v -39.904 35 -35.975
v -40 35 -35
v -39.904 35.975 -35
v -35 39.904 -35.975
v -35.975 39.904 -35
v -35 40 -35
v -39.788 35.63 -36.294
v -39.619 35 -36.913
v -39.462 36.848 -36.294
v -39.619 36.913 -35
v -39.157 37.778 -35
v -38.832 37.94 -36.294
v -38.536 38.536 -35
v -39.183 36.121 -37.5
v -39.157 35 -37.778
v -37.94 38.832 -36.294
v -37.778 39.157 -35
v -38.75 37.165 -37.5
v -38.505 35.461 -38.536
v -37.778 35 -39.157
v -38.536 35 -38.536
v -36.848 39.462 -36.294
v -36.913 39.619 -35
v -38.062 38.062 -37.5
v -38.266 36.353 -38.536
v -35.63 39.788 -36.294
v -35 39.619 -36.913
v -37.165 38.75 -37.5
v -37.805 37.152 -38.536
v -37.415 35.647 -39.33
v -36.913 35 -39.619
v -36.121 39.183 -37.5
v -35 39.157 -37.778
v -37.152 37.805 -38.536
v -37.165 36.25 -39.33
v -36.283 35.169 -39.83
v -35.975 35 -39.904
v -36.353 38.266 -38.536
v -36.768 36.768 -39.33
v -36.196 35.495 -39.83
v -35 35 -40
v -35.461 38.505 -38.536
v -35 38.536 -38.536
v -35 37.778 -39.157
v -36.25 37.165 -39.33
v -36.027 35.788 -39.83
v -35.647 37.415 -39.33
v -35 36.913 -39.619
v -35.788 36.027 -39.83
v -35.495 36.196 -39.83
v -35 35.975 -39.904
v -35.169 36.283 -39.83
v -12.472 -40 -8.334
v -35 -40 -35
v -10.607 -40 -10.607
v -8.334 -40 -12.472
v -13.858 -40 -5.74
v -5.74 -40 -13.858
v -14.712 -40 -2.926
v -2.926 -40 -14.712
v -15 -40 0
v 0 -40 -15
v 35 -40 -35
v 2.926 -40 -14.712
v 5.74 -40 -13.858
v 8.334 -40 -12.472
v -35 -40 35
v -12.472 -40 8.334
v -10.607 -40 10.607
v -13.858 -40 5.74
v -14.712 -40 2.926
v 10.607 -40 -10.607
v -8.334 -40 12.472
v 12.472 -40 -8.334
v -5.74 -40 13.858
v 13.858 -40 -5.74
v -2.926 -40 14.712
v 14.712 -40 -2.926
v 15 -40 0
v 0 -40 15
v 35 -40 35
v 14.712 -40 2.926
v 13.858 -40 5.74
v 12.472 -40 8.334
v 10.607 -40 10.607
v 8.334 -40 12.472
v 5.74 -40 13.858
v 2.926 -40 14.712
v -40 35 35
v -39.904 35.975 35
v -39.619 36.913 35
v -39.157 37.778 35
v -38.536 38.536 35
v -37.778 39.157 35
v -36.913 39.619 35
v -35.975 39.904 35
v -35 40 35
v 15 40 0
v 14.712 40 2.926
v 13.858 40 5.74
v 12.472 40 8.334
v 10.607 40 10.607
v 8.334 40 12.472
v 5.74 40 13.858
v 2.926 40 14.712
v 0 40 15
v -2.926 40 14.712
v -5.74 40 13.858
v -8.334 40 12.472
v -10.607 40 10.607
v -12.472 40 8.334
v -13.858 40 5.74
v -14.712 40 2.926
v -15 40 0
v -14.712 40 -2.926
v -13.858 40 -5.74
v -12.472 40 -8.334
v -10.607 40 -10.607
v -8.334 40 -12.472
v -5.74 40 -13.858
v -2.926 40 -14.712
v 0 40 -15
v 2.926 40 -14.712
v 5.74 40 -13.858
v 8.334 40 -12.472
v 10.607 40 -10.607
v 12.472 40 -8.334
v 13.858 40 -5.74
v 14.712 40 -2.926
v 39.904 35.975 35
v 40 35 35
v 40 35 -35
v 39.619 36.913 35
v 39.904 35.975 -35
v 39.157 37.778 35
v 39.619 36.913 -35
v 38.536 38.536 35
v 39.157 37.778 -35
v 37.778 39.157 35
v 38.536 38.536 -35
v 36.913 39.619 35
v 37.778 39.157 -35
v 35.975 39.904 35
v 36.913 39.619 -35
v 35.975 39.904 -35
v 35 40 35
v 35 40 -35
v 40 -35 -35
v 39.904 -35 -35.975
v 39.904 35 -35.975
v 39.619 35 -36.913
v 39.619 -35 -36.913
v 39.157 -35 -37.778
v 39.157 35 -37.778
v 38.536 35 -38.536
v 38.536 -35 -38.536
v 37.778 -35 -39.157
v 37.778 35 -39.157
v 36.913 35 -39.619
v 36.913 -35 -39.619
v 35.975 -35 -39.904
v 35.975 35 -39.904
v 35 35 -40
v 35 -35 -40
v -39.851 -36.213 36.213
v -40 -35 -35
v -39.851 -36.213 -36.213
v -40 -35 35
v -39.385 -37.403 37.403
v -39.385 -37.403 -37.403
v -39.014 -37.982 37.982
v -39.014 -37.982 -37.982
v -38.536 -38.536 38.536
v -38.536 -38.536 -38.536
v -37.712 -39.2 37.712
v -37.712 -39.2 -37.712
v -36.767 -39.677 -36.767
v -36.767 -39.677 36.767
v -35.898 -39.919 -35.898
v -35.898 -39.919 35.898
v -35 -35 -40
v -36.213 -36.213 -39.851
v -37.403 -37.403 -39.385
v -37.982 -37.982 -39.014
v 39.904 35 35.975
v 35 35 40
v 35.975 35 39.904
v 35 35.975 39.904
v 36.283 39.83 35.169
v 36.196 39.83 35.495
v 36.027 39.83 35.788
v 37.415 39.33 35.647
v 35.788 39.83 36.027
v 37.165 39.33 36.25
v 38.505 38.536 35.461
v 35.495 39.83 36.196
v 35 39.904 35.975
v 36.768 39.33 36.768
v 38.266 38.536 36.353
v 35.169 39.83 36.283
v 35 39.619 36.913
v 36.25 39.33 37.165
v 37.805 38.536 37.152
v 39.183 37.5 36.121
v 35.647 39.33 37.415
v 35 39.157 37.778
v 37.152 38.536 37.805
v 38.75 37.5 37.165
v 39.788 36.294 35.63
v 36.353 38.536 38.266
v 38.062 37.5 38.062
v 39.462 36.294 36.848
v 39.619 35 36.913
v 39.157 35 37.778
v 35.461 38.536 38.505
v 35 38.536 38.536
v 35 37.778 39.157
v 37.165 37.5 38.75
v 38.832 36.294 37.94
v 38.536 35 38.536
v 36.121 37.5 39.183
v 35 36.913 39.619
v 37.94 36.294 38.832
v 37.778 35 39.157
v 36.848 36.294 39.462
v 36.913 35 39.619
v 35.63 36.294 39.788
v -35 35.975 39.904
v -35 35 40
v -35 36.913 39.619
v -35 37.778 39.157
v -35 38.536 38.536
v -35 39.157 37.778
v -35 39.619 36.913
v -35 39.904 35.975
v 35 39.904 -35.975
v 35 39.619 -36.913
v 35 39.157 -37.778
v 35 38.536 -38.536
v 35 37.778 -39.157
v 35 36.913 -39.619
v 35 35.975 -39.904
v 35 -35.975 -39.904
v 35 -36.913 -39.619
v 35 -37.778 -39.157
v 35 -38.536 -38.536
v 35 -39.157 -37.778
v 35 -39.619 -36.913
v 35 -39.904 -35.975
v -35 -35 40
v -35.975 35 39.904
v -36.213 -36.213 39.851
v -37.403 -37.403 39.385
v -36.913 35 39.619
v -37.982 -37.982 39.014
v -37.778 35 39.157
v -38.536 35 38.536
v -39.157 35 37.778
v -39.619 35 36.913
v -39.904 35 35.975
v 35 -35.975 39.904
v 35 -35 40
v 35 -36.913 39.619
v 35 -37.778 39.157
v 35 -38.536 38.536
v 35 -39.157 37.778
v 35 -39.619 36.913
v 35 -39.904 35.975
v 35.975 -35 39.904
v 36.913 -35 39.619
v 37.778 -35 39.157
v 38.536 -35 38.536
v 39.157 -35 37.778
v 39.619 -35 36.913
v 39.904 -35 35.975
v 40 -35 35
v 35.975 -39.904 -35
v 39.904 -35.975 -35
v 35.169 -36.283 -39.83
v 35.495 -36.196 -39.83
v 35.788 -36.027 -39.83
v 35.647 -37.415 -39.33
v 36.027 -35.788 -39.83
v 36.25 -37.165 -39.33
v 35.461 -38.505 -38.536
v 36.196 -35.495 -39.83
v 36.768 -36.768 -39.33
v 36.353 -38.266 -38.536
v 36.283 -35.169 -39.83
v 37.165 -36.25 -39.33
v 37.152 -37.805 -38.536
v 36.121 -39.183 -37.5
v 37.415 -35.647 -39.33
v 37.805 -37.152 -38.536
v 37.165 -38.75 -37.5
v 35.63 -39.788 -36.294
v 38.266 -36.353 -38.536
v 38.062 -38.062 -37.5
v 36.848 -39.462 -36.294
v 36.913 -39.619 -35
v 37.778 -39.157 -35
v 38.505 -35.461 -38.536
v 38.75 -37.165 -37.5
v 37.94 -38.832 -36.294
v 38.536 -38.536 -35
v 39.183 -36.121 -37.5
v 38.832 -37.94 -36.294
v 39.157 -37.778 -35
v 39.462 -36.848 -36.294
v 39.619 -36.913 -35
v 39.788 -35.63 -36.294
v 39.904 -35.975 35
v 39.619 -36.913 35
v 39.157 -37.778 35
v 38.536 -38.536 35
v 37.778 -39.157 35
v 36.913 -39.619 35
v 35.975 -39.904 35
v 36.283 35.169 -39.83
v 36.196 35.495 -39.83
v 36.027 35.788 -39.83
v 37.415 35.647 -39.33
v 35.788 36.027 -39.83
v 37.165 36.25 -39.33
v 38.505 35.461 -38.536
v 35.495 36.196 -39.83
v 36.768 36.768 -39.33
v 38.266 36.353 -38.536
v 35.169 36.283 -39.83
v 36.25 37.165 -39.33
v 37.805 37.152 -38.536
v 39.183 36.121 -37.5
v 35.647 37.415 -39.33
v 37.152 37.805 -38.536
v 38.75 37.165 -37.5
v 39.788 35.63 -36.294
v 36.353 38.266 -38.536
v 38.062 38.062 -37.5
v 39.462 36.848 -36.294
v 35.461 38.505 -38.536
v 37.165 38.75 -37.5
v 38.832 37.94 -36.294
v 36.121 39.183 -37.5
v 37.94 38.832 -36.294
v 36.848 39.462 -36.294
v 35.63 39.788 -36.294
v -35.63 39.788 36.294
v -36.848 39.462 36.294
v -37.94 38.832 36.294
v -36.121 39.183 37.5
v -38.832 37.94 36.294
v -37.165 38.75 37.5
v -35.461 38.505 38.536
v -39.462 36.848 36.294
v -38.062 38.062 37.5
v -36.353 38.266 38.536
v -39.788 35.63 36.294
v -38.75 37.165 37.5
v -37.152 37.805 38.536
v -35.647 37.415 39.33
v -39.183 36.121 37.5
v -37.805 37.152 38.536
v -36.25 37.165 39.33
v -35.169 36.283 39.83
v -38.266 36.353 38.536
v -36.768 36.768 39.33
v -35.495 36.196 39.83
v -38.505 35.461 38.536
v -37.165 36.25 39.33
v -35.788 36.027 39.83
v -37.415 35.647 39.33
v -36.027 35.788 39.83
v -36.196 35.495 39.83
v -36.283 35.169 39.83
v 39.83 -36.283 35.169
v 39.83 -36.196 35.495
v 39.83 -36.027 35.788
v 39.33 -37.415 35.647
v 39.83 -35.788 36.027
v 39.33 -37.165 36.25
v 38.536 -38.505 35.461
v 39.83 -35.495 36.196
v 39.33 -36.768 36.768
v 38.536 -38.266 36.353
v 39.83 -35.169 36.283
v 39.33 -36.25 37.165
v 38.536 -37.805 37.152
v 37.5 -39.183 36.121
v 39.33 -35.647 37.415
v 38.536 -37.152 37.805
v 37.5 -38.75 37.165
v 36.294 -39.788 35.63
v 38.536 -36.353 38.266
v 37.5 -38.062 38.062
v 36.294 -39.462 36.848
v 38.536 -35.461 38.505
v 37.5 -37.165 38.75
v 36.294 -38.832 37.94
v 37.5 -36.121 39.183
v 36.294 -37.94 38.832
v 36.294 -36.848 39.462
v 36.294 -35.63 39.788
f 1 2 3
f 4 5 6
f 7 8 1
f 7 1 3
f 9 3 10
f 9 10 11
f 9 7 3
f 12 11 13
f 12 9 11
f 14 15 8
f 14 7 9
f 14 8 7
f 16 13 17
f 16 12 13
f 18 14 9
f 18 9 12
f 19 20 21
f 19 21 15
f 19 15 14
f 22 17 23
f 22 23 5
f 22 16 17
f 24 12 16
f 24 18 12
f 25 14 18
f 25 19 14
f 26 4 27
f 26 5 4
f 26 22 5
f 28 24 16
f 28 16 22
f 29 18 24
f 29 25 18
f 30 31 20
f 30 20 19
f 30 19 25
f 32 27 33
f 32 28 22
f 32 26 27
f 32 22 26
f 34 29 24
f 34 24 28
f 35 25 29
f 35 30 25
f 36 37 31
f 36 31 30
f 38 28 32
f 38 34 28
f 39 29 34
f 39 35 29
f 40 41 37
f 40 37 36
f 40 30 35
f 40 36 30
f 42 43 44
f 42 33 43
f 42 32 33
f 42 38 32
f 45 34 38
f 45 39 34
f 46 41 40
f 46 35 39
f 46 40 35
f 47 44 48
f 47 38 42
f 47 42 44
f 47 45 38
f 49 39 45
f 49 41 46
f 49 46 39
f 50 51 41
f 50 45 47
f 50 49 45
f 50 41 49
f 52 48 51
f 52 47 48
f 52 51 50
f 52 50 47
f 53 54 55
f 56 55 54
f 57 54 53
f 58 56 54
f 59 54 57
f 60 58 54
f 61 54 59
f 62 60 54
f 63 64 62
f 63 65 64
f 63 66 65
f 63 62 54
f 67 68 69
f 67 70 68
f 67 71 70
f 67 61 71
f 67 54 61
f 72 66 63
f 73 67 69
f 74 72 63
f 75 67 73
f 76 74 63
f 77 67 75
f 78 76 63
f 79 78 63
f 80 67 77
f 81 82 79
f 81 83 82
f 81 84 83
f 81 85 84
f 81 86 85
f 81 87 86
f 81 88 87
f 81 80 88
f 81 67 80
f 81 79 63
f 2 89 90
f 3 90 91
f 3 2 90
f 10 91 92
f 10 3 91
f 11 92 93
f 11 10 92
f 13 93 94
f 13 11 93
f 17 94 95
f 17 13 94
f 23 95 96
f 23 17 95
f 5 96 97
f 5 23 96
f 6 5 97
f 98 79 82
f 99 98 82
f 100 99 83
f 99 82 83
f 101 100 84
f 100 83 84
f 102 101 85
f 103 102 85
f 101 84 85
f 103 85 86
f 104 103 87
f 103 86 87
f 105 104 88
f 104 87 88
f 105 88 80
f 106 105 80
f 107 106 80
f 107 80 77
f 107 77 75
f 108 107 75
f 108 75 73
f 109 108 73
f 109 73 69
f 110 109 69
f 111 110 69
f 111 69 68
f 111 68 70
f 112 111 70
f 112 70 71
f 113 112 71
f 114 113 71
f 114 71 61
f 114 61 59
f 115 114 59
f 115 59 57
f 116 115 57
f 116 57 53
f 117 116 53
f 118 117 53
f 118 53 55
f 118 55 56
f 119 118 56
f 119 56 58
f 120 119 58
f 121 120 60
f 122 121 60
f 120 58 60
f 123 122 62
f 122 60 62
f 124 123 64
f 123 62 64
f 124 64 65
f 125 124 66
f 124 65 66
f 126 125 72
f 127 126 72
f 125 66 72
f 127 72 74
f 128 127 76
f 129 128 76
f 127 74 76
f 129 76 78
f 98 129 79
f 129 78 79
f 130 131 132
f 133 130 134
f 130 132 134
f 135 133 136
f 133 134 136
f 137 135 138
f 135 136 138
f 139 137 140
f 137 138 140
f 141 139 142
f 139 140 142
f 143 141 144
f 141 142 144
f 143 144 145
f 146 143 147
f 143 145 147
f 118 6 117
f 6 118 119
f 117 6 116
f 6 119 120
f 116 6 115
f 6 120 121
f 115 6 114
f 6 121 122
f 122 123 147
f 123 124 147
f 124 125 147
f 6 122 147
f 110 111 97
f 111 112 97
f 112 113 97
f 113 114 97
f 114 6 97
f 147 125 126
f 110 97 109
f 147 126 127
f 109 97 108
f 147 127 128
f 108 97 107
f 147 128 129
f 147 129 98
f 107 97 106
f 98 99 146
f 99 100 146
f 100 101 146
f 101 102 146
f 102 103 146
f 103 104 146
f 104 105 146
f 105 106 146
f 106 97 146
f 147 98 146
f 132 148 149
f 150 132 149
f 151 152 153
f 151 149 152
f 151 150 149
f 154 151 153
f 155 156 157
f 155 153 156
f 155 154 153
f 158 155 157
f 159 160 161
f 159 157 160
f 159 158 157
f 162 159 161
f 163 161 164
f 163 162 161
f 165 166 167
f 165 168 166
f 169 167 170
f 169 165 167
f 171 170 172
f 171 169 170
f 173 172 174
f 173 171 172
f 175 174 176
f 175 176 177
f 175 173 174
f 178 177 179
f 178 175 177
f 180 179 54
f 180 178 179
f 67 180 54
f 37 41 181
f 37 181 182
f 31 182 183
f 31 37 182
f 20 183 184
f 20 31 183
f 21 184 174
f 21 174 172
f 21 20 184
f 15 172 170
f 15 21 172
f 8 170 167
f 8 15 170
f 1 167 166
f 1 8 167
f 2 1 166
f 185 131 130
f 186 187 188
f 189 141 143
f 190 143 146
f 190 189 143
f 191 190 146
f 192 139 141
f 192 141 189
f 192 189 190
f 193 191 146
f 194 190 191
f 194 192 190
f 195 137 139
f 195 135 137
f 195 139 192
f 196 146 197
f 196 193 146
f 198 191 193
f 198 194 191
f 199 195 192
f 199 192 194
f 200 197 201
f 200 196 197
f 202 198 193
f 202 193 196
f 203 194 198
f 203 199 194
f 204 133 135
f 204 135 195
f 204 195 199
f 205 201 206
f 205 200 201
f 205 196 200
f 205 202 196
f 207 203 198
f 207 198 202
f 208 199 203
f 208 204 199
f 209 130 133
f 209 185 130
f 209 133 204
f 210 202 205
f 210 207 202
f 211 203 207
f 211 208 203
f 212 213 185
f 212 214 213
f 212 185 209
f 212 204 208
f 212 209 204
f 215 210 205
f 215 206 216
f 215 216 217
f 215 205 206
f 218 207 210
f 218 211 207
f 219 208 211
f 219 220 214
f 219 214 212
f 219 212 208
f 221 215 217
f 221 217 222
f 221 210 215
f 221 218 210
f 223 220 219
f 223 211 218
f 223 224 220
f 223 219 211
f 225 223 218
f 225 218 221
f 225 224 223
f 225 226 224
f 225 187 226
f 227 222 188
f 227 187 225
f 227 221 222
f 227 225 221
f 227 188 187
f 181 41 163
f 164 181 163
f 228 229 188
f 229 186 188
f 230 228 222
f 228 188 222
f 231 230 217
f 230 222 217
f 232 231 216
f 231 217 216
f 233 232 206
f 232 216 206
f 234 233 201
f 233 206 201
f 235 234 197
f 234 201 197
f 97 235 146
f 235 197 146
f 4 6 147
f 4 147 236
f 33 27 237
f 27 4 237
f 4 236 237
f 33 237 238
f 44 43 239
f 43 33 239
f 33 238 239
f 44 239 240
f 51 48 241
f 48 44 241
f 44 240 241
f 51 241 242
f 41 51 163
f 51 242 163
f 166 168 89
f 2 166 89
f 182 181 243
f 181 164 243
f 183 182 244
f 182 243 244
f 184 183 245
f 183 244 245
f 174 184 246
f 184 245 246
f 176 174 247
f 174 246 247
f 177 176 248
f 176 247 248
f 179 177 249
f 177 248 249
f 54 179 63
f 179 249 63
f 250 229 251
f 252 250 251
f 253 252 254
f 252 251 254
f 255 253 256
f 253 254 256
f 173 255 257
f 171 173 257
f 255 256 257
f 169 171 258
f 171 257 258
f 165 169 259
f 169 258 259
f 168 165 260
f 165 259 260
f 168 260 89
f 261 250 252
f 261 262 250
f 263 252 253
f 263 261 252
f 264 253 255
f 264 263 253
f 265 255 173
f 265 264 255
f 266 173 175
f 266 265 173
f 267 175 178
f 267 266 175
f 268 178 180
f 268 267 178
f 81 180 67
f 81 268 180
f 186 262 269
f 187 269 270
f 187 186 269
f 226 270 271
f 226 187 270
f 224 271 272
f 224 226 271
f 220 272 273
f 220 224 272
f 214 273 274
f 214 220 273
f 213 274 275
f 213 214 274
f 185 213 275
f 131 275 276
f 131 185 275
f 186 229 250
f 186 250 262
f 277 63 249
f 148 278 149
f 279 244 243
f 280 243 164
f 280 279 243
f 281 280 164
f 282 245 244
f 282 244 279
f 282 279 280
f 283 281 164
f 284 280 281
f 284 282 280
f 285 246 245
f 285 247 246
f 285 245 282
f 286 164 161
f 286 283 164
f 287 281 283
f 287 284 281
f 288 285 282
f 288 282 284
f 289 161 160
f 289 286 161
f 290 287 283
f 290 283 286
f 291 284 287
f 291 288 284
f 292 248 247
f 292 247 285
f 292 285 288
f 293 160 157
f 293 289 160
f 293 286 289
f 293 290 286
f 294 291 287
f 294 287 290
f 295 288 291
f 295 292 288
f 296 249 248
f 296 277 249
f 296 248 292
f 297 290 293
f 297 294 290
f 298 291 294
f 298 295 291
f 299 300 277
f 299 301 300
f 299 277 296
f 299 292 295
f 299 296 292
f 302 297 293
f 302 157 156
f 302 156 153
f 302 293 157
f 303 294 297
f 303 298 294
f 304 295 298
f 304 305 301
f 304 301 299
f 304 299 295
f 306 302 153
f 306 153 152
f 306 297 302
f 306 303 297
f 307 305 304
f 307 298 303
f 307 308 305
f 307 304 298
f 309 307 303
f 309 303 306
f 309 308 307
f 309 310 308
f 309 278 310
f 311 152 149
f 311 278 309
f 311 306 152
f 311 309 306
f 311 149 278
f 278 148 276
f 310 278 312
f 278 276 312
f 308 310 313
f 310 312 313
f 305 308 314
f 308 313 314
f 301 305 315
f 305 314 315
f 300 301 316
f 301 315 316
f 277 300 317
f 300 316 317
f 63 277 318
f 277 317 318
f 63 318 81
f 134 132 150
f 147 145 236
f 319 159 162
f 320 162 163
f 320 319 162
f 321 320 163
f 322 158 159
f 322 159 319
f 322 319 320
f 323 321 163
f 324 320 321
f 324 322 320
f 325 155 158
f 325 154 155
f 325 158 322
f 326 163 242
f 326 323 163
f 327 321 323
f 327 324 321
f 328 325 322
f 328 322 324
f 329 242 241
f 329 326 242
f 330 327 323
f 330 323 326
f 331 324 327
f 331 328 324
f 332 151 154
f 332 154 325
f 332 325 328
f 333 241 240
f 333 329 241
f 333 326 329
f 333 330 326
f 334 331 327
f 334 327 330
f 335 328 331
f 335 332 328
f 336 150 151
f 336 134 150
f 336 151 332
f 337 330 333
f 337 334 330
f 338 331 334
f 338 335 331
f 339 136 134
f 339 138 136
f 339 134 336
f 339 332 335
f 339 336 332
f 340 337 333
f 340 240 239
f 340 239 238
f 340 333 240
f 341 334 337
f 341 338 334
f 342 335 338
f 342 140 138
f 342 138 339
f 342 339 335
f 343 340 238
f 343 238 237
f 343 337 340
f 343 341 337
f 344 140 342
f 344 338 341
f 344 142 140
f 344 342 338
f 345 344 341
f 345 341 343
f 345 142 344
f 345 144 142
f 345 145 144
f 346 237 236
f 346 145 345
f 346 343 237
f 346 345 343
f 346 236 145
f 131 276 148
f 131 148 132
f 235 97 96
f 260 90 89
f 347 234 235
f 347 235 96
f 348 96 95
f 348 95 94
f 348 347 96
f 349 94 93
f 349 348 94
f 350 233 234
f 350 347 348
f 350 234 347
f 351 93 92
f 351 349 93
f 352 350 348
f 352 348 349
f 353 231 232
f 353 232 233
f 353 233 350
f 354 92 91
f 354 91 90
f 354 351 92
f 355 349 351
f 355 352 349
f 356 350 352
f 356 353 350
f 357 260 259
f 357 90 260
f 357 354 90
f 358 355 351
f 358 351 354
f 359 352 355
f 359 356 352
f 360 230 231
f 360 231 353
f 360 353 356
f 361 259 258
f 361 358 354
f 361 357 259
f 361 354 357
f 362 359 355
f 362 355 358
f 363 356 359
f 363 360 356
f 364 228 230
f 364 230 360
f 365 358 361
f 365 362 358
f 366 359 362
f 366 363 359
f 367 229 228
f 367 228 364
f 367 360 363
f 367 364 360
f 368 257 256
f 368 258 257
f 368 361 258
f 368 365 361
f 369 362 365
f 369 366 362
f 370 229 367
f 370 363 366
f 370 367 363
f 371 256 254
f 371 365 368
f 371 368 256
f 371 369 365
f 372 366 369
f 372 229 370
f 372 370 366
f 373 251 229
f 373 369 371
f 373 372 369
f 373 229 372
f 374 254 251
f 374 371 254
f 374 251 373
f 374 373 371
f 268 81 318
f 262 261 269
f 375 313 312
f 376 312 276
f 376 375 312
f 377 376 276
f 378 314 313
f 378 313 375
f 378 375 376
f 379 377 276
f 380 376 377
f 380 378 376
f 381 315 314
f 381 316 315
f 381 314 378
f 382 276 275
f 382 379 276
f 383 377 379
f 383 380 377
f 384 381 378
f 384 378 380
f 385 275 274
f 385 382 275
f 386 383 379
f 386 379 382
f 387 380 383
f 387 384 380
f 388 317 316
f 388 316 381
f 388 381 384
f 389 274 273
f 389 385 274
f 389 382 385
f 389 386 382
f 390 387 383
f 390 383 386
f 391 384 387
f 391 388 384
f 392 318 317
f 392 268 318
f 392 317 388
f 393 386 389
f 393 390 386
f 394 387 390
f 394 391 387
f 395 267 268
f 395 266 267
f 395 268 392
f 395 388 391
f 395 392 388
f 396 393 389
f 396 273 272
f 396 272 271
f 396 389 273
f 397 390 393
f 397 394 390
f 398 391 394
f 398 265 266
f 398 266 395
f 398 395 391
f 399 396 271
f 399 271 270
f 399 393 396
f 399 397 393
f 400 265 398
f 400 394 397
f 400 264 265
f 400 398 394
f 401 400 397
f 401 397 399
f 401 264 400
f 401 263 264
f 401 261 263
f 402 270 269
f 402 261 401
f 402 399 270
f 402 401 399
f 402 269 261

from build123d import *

# Parameters (mm, degrees)
F0_W         = 80
F0_H         = 80
F1_DEPTH     = 40
F2_R         = 5
F3_T1_DEPTH  = 82.5
F3_S5_W      = 5.1
F3_S5_H      = 5.1
F3_T6_DEPTH  = 5.1
F3_S11_W     = 5.1
F3_S11_H     = 5.1
F3_T12_DEPTH = 5.1
F4_R         = 15
F5_DEPTH     = 80.001


# Not quite as in the source:
# - a fillet or chamfer that OpenCascade refuses, or shapes differently, is made with other operations: its cross-section is extruded or revolved along the edge and cut away or added


with BuildPart() as f1:
    # F0 (on Top) → F1 (new body, symmetric)
    with BuildSketch(Plane.XY):
        Rectangle(F0_W, F0_H)
    extrude(amount=F1_DEPTH, both=True)

    # F2
    f2_edges = [f1.edges().sort_by_distance(p)[0] for p in [
        (0, -40, 40),
        (-40, -40, 0),
        (40, -40, 0),
        (0, -40, -40),
        (40, 0, 40),
        (40, 40, 0),
        (40, 0, -40),
        (0, 40, 40),
        (-40, 40, 0),
        (0, 40, -40),
    ]]
    fillet(f2_edges, radius=F2_R)

    # F3: fillet of radius 5 on 6 edges, made by hand

    # F3_s2 → F3_t1 (cut)
    with BuildSketch(Plane.XZ.offset(-35)):
        with BuildLine():
            ThreePointArc((-35, 40), (-38.5355339059, 38.5355339059), (-40, 35))
            Line((-40, 35), (-40, 40))
            Line((-40, 40), (-35, 40))
        make_face()
        with BuildLine():
            ThreePointArc((-35, -40), (-38.5355339059, -38.5355339059), (-40, -35))
            Line((-40, -35), (-40, -40))
            Line((-40, -40), (-35, -40))
        make_face()
    extrude(amount=F3_T1_DEPTH, mode=Mode.SUBTRACT)


with BuildPart() as f3_tool4:
    # F3_s5 → F3_t6 (new body)
    with BuildSketch(Plane.XY.offset(-35)):
        with Locations((-37.55, 37.55)):
            Rectangle(F3_S5_W, F3_S5_H)
    extrude(amount=-F3_T6_DEPTH)

    # F3_s7 → F3_t8 (revolve, cut)
    with BuildSketch(Plane(origin=(-35, 35, -35), x_dir=(0.7071067812, -0.7071067812, 0), z_dir=(0.7071067812, 0.7071067812, 0))):
        with BuildLine():
            ThreePointArc((0, -5), (5, 0), (0, 5))
            Line((0, 5), (0, -5))
        make_face()
    revolve(axis=Axis((-35, 35, -35), (0, 0, -1)), mode=Mode.SUBTRACT)


with BuildPart() as f1_1:
    add(f1.part)

    # F3_t3: cut F3_tool4
    add(f3_tool4.part, mode=Mode.SUBTRACT)


with BuildPart() as f3_tool10:
    # F3_s11 → F3_t12 (new body)
    with BuildSketch(Plane.XY.offset(35)):
        with Locations((-37.55, 37.55)):
            Rectangle(F3_S11_W, F3_S11_H)
    extrude(amount=F3_T12_DEPTH)

    # F3_s13 → F3_t14 (revolve, cut)
    with BuildSketch(Plane(origin=(-35, 35, 35), x_dir=(0.7071067812, -0.7071067812, 0), z_dir=(-0.7071067812, -0.7071067812, 0))):
        with BuildLine():
            ThreePointArc((0, -5), (5, 0), (0, 5))
            Line((0, 5), (0, -5))
        make_face()
    revolve(axis=Axis((-35, 35, 35), (0, 0, 1)), mode=Mode.SUBTRACT)


with BuildPart() as f1_2:
    add(f1_1.part)

    # F3_t9: cut F3_tool10
    add(f3_tool10.part, mode=Mode.SUBTRACT)

    # F4 (on face) → F5 (cut, through all)
    with BuildSketch(Plane.XZ.offset(40)):
        Circle(F4_R)
    extrude(amount=-F5_DEPTH, mode=Mode.SUBTRACT)


solid = f1_2.part
